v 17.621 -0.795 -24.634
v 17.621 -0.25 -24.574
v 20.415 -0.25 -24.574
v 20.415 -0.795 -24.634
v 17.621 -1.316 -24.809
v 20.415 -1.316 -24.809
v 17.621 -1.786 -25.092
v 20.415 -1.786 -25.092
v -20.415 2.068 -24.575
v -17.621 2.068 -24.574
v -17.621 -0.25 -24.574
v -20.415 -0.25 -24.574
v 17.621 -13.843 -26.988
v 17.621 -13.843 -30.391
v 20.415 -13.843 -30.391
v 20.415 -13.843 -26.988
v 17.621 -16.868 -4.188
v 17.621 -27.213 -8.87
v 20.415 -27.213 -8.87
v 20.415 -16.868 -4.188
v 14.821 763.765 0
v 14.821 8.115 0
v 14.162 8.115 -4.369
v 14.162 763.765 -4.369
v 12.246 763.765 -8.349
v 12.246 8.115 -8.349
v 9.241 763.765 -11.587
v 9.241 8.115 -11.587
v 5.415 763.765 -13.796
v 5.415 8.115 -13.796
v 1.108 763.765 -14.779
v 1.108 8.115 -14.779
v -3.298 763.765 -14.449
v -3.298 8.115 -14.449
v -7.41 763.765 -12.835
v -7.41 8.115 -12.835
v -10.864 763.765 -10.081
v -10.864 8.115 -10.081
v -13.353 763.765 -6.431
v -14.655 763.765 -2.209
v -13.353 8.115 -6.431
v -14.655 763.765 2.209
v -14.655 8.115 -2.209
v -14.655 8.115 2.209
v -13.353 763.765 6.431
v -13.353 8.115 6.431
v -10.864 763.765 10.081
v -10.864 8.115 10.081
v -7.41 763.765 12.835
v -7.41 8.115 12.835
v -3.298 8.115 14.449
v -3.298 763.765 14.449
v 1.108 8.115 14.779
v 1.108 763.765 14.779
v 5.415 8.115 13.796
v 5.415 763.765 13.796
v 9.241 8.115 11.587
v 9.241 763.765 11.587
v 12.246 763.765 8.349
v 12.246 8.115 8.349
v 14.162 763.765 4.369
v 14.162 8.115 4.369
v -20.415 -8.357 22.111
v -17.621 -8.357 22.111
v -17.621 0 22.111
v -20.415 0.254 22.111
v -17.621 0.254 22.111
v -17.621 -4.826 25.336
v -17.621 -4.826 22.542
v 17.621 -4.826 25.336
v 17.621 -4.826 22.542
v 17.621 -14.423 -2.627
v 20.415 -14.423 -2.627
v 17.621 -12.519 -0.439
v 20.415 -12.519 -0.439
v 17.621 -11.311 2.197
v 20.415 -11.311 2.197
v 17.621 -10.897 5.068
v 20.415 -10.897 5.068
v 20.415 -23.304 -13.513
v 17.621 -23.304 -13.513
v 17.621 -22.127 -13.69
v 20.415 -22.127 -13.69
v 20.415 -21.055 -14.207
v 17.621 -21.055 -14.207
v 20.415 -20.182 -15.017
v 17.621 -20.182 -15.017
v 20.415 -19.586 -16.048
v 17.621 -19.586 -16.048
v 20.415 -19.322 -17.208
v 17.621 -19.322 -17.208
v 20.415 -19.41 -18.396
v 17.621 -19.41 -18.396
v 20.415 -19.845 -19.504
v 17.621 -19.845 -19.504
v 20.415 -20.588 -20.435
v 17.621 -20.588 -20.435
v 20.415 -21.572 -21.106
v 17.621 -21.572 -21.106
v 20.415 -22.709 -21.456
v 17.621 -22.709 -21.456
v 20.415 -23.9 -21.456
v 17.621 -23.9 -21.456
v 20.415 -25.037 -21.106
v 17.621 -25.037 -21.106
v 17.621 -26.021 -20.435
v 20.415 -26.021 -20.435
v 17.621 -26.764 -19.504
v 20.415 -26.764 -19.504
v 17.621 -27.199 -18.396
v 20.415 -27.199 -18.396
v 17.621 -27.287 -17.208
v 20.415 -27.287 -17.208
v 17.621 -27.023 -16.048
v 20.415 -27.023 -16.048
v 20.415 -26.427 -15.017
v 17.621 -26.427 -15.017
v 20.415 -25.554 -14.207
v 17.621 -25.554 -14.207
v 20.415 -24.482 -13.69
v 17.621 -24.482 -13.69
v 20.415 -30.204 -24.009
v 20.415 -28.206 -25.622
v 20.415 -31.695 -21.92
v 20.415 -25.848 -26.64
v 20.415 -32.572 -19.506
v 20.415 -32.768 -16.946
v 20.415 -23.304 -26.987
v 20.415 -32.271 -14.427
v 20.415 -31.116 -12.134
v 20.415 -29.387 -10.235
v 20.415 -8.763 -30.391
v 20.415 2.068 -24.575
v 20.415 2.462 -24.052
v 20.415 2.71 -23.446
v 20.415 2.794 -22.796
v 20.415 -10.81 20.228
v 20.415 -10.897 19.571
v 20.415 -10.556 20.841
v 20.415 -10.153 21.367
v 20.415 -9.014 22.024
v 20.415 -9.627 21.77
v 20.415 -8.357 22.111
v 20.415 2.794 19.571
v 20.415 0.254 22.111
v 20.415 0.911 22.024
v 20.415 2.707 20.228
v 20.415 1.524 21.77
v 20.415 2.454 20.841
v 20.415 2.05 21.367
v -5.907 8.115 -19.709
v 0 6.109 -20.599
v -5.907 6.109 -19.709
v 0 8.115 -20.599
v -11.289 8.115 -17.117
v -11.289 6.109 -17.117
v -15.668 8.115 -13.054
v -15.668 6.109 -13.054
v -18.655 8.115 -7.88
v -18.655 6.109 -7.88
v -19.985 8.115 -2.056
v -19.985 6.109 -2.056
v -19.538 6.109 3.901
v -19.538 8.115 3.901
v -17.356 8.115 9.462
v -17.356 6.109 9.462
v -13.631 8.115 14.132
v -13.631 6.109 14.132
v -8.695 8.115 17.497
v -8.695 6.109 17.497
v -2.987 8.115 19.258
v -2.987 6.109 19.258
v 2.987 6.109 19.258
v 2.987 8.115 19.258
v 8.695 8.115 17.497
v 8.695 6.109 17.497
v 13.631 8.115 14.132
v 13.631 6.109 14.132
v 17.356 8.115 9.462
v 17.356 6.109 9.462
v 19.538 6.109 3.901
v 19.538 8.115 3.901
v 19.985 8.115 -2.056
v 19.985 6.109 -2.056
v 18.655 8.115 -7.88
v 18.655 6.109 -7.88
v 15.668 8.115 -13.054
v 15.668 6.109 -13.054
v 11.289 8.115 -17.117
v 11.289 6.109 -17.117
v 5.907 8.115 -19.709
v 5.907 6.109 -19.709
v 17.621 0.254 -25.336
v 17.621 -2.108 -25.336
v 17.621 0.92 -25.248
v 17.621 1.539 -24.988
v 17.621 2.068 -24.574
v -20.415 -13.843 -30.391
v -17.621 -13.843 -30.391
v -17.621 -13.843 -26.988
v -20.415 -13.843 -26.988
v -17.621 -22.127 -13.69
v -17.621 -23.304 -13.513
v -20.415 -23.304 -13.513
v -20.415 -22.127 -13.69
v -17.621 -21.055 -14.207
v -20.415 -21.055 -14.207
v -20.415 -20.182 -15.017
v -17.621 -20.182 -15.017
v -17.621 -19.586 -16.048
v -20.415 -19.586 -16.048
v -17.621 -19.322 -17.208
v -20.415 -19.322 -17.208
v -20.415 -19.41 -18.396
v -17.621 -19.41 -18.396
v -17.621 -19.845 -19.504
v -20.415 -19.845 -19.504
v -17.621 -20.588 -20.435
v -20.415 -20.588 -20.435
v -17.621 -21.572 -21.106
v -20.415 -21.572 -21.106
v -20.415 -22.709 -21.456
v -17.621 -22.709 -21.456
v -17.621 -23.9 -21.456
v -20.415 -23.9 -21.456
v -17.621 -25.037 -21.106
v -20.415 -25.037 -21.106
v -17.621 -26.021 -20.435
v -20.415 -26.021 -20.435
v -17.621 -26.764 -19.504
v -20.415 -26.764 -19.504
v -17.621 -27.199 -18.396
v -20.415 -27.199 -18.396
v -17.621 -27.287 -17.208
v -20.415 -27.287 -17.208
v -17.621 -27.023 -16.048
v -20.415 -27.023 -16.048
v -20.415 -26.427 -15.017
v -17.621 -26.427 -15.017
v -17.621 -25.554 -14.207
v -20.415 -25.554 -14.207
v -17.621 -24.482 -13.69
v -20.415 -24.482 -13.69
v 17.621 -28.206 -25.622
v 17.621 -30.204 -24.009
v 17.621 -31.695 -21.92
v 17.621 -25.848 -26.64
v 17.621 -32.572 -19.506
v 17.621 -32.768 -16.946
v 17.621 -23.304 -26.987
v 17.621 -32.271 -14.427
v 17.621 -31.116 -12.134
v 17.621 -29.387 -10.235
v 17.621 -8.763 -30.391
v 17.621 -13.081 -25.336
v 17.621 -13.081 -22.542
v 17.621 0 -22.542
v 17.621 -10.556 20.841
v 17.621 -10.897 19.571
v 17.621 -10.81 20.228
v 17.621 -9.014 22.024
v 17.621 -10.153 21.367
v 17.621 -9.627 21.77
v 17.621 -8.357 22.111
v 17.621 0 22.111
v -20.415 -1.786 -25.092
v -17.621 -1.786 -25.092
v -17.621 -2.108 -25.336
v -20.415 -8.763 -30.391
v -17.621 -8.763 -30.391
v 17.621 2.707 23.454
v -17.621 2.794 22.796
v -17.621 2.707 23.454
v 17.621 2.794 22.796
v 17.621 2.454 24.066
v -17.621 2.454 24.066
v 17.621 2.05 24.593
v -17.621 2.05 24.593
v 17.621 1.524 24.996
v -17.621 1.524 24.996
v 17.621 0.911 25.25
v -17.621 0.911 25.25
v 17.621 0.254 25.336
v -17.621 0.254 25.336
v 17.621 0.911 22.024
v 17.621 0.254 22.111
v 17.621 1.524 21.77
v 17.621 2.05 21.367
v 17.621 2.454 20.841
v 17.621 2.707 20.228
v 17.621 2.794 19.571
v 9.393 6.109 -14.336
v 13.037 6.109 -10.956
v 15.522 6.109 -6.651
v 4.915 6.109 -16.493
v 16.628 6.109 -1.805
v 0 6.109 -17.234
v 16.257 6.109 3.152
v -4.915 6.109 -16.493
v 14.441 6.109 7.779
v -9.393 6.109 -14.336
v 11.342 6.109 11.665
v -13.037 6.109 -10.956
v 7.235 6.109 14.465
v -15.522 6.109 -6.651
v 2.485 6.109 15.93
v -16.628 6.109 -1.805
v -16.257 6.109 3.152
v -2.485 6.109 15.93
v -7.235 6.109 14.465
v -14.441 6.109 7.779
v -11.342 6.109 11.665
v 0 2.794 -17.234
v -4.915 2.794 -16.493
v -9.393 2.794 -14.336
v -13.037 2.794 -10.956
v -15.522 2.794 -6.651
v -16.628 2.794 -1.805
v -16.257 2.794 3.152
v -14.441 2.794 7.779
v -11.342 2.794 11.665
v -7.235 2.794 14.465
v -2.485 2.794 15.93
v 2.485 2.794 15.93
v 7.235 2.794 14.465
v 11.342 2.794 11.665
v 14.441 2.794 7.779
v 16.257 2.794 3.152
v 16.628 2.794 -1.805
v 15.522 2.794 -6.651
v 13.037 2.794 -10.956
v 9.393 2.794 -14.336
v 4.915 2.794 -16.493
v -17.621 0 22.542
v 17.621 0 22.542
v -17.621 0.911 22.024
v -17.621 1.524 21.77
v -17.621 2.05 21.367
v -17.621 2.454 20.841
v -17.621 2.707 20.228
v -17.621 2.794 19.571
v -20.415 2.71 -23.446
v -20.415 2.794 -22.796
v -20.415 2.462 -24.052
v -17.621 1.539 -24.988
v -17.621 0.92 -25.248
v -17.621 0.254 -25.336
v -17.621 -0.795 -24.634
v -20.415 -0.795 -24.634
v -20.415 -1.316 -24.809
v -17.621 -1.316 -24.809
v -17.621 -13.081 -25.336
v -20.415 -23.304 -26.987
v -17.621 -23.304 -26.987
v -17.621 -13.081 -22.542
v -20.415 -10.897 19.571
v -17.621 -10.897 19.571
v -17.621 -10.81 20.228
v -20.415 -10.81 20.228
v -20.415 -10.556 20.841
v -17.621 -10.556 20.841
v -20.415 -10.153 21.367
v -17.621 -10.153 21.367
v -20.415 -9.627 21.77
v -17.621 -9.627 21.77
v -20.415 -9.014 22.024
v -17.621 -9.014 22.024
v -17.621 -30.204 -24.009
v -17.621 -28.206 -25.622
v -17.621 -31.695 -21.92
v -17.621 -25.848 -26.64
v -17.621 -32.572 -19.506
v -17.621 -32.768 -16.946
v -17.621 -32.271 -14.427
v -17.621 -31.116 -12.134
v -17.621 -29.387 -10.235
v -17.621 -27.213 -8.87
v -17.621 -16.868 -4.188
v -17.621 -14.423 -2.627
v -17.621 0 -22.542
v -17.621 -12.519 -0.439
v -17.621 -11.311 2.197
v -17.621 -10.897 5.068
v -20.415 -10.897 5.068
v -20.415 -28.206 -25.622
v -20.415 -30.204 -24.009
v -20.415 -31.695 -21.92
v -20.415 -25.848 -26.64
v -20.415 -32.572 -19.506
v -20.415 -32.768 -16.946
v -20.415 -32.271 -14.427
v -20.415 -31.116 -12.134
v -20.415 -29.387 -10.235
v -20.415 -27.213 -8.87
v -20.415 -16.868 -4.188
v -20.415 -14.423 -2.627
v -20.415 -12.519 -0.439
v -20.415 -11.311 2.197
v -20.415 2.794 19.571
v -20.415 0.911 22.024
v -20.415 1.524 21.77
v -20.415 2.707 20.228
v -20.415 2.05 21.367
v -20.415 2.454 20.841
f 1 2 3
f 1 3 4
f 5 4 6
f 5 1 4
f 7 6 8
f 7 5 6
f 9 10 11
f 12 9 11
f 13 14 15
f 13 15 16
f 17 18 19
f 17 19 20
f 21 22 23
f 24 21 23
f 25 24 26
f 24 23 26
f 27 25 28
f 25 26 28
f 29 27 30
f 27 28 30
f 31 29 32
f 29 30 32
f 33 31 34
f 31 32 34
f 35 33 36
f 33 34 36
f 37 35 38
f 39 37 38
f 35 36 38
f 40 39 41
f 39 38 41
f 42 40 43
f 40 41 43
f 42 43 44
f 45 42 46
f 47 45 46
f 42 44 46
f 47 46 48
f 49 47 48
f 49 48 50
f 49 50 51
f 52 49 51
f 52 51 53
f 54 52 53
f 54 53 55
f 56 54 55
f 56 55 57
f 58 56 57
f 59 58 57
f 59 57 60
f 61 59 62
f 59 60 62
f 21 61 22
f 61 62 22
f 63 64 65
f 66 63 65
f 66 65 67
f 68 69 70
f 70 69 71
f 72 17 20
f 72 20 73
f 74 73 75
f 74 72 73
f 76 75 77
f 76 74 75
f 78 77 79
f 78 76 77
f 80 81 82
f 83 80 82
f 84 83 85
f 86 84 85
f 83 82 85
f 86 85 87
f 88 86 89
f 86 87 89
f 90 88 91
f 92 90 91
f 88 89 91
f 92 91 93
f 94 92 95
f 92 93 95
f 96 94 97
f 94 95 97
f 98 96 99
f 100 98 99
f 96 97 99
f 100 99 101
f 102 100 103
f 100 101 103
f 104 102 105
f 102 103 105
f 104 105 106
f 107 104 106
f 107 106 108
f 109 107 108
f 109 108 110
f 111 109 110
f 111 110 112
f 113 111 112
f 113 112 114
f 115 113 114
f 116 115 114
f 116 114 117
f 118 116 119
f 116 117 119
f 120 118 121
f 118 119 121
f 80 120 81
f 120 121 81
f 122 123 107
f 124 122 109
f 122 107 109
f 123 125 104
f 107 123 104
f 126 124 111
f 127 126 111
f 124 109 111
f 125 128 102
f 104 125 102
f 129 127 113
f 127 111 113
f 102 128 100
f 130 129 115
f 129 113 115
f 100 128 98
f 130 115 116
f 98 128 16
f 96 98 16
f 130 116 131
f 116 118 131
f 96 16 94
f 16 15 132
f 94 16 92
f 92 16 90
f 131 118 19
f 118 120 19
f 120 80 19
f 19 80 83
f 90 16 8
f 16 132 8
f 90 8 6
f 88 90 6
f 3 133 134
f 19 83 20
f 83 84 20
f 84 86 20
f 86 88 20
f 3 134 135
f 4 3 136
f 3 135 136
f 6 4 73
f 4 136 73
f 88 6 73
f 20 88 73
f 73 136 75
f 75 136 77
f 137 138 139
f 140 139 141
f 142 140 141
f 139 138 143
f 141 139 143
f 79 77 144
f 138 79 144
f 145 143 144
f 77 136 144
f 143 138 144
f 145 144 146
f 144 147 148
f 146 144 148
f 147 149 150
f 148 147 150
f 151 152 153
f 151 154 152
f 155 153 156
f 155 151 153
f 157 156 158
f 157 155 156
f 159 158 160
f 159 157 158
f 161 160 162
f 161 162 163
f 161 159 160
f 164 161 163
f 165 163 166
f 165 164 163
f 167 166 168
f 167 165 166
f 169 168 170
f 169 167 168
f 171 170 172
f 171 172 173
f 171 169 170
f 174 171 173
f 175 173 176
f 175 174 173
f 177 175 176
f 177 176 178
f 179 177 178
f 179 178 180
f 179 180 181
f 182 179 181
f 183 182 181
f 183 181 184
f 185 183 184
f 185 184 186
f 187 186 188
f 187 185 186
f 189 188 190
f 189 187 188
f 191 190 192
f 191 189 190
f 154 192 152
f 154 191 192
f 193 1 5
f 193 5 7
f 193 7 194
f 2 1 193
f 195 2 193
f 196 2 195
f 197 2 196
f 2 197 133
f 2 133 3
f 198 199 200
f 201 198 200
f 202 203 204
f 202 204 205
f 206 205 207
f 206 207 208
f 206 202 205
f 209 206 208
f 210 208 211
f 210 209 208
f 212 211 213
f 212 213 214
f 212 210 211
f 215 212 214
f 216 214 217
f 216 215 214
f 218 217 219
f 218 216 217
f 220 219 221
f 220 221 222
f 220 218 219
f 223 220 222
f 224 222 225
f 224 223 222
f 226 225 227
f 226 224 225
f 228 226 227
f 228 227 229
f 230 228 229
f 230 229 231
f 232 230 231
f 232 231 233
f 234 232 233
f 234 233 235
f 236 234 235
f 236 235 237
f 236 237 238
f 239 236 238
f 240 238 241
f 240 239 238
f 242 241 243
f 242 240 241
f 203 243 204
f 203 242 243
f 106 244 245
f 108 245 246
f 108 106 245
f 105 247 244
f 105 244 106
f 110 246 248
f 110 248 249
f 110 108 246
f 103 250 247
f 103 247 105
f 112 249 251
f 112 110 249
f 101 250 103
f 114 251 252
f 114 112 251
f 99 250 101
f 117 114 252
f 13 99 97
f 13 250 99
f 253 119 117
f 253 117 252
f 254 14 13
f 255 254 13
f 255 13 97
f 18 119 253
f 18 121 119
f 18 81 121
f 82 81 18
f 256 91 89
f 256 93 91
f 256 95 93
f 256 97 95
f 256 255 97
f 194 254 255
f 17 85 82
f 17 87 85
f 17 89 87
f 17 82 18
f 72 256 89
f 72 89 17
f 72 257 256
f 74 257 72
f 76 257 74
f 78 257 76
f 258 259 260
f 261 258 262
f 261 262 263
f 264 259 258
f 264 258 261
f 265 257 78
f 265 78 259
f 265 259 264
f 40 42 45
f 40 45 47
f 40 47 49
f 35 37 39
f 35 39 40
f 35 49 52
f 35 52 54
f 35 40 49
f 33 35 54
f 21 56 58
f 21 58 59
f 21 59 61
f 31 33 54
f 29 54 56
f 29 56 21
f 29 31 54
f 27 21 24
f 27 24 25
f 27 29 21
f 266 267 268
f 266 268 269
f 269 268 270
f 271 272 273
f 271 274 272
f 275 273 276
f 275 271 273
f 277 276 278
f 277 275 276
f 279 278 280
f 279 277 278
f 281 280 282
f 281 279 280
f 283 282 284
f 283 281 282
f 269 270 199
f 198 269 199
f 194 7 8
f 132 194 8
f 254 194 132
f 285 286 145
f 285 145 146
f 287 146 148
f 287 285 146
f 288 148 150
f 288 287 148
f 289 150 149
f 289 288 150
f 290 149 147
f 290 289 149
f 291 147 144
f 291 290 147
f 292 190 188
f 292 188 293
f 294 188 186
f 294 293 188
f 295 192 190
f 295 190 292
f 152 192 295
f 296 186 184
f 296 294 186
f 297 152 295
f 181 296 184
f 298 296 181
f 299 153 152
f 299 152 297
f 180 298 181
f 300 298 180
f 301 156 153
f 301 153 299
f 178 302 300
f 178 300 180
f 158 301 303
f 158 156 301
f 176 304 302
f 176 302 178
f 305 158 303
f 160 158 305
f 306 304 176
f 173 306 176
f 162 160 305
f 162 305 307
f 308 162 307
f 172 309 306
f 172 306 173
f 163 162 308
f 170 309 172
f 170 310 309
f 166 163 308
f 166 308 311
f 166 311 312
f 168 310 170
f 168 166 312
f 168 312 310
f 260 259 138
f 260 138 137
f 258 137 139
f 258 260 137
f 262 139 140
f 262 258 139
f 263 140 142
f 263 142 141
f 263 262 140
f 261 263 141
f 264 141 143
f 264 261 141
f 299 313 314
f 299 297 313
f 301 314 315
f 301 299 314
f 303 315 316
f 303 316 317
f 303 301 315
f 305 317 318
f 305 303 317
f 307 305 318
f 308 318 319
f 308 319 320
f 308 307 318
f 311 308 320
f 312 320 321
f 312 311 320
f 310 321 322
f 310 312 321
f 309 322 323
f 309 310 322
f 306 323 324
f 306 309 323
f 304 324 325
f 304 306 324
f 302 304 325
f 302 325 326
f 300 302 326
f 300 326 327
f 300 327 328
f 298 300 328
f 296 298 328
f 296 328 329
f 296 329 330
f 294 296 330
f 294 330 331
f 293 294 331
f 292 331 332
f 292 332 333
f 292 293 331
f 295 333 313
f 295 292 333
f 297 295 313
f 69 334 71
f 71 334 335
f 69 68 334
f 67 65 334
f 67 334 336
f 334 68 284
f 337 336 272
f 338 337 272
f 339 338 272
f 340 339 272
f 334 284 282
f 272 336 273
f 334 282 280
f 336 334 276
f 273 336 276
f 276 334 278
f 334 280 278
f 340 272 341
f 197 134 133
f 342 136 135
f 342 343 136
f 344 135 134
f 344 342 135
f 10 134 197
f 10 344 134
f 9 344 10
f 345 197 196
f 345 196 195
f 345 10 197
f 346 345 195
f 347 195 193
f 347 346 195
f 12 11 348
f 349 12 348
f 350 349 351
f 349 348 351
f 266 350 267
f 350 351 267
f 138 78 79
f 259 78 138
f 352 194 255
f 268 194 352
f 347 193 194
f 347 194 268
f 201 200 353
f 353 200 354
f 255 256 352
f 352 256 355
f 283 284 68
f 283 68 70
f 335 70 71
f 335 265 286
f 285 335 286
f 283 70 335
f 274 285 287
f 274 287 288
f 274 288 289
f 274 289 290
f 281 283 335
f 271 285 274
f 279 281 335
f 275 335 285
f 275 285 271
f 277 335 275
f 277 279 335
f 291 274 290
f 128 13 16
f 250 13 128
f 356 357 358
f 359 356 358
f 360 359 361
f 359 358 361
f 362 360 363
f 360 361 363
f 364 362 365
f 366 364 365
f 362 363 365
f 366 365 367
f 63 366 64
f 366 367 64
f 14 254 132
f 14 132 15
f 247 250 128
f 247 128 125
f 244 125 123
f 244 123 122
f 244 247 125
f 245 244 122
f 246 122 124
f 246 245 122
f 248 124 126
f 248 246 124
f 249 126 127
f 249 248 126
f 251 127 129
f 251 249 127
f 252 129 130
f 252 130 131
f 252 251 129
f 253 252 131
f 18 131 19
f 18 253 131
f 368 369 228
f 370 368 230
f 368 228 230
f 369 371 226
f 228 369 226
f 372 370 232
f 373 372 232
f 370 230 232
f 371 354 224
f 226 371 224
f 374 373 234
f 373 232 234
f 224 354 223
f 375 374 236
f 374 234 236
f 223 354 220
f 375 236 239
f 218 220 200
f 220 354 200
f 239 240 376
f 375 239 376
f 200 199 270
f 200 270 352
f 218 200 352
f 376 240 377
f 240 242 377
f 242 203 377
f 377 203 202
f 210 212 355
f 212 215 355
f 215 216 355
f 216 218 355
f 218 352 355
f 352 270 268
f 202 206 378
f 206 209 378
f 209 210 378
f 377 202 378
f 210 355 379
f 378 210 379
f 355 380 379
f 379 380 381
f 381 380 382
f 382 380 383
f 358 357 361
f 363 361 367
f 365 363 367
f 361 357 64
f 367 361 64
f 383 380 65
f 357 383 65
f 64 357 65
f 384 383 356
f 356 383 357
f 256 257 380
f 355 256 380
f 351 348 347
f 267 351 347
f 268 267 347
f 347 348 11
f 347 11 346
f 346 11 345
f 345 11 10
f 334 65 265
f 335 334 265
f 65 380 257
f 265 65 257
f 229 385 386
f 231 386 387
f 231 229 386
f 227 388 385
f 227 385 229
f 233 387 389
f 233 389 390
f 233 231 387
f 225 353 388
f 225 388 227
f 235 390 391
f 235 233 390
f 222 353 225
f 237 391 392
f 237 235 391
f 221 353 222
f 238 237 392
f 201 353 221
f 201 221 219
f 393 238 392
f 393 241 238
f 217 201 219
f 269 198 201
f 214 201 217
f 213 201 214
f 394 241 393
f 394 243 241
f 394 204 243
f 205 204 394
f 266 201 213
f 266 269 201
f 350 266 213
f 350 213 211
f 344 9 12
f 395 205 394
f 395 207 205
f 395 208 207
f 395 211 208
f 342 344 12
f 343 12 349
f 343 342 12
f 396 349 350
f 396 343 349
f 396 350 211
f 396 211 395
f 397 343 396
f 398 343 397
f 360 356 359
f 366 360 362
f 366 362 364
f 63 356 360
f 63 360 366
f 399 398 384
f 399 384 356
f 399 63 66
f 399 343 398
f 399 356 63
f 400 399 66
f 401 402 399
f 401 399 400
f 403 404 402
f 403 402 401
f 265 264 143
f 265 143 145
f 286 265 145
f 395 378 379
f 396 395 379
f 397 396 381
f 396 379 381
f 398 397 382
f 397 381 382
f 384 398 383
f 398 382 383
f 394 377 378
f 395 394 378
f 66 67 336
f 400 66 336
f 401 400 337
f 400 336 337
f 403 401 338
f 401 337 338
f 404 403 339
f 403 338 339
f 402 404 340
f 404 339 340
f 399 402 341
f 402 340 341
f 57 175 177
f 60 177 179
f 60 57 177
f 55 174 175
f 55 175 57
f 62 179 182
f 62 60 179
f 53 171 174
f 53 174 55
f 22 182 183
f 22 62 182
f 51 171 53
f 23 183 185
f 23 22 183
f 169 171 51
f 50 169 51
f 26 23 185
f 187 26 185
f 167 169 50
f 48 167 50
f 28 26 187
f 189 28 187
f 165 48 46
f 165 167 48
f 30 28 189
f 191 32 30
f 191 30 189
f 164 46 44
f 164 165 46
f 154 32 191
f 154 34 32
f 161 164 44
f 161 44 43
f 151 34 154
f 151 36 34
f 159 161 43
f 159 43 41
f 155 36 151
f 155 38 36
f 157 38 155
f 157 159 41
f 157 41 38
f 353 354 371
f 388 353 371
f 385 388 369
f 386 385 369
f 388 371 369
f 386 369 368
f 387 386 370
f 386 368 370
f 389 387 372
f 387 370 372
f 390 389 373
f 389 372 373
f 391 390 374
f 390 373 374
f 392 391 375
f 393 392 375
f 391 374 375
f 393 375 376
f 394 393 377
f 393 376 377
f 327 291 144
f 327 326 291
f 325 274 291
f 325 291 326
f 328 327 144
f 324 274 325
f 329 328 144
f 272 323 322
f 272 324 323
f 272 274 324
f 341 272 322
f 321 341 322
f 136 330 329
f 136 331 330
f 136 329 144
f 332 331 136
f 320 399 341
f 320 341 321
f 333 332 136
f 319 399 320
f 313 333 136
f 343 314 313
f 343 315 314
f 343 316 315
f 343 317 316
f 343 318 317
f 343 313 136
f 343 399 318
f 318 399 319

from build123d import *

# Parameters (mm, degrees)
SKETCH1_W           = 35.2425
SKETCH1_H           = 45.085
BOSS_EXTRUDE1_DEPTH = 2.794
SKETCH3_W           = 35.2425
SKETCH3_H           = 7.62
BOSS_EXTRUDE2_DEPTH = 2.794
SKETCH4_W           = 35.2425
SKETCH4_H           = 15.875
BOSS_EXTRUDE3_DEPTH = 2.794
SKETCH5_R           = 3.99415
BOSS_EXTRUDE5_DEPTH = 2.794
SKETCH8_R           = 14.8209
BOSS_EXTRUDE6_DEPTH = 755.65
FILLET1_R           = 2.54


with BuildPart() as part:
    # Sketch1 → Boss-Extrude1 (new body)
    with BuildSketch(Plane(origin=(0, 0, 0), x_dir=(1, 0, 0), z_dir=(0, 1, 0))):
        Rectangle(SKETCH1_W, SKETCH1_H)
    extrude(amount=BOSS_EXTRUDE1_DEPTH)

    # Sketch3 → Boss-Extrude2 (add)
    with BuildSketch(Plane.XY.offset(22.5425)):
        with Locations((0, -1.016)):
            Rectangle(SKETCH3_W, SKETCH3_H)
    extrude(amount=BOSS_EXTRUDE2_DEPTH)

    # Sketch4 → Boss-Extrude3 (add)
    with BuildSketch(Plane(origin=(0, 0, -22.5425), x_dir=(-1, 0, 0), z_dir=(0, 0, -1))):
        with Locations((0, -5.1435)):
            Rectangle(SKETCH4_W, SKETCH4_H)
    extrude(amount=BOSS_EXTRUDE3_DEPTH)

    # Sketch5 → Boss-Extrude5 (add)
    with BuildSketch(Plane.ZY.offset(17.62125)):
        with BuildLine():
            Line((-24.5745, 2.794), (-24.5745, -0.249652205))
            ThreePointArc((-24.5745, -0.249652205), (-24.707295287, -1.060186269), (-25.091795645, -1.785968283))
            Line((-25.091795645, -1.785968283), (-30.3911, -8.763))
            Line((-30.3911, -8.763), (-30.3911, -13.843))
            Line((-30.3911, -13.843), (-26.9875, -13.843))
            Line((-26.9875, -13.843), (-26.9875, -23.3045))
            ThreePointArc((-26.9875, -23.3045), (-19.506235123, -32.571845213), (-8.869629771, -27.213147793))
            Line((-8.869629771, -27.213147793), (-4.188060723, -16.867828085))
            ThreePointArc((-4.188060723, -16.867828085), (-0.439339327, -12.518932794), (5.068277097, -10.8966))
            Line((5.068277097, -10.8966), (19.5707, -10.8966))
            ThreePointArc((19.5707, -10.8966), (21.366751224, -10.152651224), (22.1107, -8.3566))
            Line((22.1107, -8.3566), (22.1107, 0.254))
            ThreePointArc((22.1107, 0.254), (21.366751224, 2.050051224), (19.5707, 2.794))
            Line((19.5707, 2.794), (-24.5745, 2.794))
        make_face()
        with Locations((-17.50695, -23.3045)):
            Circle(SKETCH5_R, mode=Mode.SUBTRACT)
    boss_extrude5 = extrude(amount=BOSS_EXTRUDE5_DEPTH)

    # Mirror1: Boss-Extrude5 across plane
    add(boss_extrude5.mirror(Plane(origin=(0, 0, 0), x_dir=(0, 0, 1), z_dir=(1, 0, 0))))

    # Sketch6 → Revolve1 (revolve)
    with BuildSketch(Plane(origin=(0, 0, 0), x_dir=(0, 0, -1), z_dir=(1, 0, 0))):
        Polygon((0.5588, 2.794), (17.2339, 2.794), (17.2339, 6.1087), (20.5994, 6.1087), (20.5994, 8.1153), (0.5588, 8.1153), align=None)
    revolve(axis=Axis((0, 2.794, -0.5588), (0, 1, 0)))

    # Sketch8 → Boss-Extrude6 (add)
    with BuildSketch(Plane(origin=(0, 8.1153, 0), x_dir=(1, 0, 0), z_dir=(0, 1, 0))):
        Circle(SKETCH8_R)
    extrude(amount=BOSS_EXTRUDE6_DEPTH)

    # Fillet1
    fillet1_edges = [part.edges().sort_by_distance(p)[0] for p in [
        (0, 2.794, -25.3365),
        (0, 2.794, 25.3365),
    ]]
    fillet(fillet1_edges, radius=FILLET1_R)


solid = part.part
